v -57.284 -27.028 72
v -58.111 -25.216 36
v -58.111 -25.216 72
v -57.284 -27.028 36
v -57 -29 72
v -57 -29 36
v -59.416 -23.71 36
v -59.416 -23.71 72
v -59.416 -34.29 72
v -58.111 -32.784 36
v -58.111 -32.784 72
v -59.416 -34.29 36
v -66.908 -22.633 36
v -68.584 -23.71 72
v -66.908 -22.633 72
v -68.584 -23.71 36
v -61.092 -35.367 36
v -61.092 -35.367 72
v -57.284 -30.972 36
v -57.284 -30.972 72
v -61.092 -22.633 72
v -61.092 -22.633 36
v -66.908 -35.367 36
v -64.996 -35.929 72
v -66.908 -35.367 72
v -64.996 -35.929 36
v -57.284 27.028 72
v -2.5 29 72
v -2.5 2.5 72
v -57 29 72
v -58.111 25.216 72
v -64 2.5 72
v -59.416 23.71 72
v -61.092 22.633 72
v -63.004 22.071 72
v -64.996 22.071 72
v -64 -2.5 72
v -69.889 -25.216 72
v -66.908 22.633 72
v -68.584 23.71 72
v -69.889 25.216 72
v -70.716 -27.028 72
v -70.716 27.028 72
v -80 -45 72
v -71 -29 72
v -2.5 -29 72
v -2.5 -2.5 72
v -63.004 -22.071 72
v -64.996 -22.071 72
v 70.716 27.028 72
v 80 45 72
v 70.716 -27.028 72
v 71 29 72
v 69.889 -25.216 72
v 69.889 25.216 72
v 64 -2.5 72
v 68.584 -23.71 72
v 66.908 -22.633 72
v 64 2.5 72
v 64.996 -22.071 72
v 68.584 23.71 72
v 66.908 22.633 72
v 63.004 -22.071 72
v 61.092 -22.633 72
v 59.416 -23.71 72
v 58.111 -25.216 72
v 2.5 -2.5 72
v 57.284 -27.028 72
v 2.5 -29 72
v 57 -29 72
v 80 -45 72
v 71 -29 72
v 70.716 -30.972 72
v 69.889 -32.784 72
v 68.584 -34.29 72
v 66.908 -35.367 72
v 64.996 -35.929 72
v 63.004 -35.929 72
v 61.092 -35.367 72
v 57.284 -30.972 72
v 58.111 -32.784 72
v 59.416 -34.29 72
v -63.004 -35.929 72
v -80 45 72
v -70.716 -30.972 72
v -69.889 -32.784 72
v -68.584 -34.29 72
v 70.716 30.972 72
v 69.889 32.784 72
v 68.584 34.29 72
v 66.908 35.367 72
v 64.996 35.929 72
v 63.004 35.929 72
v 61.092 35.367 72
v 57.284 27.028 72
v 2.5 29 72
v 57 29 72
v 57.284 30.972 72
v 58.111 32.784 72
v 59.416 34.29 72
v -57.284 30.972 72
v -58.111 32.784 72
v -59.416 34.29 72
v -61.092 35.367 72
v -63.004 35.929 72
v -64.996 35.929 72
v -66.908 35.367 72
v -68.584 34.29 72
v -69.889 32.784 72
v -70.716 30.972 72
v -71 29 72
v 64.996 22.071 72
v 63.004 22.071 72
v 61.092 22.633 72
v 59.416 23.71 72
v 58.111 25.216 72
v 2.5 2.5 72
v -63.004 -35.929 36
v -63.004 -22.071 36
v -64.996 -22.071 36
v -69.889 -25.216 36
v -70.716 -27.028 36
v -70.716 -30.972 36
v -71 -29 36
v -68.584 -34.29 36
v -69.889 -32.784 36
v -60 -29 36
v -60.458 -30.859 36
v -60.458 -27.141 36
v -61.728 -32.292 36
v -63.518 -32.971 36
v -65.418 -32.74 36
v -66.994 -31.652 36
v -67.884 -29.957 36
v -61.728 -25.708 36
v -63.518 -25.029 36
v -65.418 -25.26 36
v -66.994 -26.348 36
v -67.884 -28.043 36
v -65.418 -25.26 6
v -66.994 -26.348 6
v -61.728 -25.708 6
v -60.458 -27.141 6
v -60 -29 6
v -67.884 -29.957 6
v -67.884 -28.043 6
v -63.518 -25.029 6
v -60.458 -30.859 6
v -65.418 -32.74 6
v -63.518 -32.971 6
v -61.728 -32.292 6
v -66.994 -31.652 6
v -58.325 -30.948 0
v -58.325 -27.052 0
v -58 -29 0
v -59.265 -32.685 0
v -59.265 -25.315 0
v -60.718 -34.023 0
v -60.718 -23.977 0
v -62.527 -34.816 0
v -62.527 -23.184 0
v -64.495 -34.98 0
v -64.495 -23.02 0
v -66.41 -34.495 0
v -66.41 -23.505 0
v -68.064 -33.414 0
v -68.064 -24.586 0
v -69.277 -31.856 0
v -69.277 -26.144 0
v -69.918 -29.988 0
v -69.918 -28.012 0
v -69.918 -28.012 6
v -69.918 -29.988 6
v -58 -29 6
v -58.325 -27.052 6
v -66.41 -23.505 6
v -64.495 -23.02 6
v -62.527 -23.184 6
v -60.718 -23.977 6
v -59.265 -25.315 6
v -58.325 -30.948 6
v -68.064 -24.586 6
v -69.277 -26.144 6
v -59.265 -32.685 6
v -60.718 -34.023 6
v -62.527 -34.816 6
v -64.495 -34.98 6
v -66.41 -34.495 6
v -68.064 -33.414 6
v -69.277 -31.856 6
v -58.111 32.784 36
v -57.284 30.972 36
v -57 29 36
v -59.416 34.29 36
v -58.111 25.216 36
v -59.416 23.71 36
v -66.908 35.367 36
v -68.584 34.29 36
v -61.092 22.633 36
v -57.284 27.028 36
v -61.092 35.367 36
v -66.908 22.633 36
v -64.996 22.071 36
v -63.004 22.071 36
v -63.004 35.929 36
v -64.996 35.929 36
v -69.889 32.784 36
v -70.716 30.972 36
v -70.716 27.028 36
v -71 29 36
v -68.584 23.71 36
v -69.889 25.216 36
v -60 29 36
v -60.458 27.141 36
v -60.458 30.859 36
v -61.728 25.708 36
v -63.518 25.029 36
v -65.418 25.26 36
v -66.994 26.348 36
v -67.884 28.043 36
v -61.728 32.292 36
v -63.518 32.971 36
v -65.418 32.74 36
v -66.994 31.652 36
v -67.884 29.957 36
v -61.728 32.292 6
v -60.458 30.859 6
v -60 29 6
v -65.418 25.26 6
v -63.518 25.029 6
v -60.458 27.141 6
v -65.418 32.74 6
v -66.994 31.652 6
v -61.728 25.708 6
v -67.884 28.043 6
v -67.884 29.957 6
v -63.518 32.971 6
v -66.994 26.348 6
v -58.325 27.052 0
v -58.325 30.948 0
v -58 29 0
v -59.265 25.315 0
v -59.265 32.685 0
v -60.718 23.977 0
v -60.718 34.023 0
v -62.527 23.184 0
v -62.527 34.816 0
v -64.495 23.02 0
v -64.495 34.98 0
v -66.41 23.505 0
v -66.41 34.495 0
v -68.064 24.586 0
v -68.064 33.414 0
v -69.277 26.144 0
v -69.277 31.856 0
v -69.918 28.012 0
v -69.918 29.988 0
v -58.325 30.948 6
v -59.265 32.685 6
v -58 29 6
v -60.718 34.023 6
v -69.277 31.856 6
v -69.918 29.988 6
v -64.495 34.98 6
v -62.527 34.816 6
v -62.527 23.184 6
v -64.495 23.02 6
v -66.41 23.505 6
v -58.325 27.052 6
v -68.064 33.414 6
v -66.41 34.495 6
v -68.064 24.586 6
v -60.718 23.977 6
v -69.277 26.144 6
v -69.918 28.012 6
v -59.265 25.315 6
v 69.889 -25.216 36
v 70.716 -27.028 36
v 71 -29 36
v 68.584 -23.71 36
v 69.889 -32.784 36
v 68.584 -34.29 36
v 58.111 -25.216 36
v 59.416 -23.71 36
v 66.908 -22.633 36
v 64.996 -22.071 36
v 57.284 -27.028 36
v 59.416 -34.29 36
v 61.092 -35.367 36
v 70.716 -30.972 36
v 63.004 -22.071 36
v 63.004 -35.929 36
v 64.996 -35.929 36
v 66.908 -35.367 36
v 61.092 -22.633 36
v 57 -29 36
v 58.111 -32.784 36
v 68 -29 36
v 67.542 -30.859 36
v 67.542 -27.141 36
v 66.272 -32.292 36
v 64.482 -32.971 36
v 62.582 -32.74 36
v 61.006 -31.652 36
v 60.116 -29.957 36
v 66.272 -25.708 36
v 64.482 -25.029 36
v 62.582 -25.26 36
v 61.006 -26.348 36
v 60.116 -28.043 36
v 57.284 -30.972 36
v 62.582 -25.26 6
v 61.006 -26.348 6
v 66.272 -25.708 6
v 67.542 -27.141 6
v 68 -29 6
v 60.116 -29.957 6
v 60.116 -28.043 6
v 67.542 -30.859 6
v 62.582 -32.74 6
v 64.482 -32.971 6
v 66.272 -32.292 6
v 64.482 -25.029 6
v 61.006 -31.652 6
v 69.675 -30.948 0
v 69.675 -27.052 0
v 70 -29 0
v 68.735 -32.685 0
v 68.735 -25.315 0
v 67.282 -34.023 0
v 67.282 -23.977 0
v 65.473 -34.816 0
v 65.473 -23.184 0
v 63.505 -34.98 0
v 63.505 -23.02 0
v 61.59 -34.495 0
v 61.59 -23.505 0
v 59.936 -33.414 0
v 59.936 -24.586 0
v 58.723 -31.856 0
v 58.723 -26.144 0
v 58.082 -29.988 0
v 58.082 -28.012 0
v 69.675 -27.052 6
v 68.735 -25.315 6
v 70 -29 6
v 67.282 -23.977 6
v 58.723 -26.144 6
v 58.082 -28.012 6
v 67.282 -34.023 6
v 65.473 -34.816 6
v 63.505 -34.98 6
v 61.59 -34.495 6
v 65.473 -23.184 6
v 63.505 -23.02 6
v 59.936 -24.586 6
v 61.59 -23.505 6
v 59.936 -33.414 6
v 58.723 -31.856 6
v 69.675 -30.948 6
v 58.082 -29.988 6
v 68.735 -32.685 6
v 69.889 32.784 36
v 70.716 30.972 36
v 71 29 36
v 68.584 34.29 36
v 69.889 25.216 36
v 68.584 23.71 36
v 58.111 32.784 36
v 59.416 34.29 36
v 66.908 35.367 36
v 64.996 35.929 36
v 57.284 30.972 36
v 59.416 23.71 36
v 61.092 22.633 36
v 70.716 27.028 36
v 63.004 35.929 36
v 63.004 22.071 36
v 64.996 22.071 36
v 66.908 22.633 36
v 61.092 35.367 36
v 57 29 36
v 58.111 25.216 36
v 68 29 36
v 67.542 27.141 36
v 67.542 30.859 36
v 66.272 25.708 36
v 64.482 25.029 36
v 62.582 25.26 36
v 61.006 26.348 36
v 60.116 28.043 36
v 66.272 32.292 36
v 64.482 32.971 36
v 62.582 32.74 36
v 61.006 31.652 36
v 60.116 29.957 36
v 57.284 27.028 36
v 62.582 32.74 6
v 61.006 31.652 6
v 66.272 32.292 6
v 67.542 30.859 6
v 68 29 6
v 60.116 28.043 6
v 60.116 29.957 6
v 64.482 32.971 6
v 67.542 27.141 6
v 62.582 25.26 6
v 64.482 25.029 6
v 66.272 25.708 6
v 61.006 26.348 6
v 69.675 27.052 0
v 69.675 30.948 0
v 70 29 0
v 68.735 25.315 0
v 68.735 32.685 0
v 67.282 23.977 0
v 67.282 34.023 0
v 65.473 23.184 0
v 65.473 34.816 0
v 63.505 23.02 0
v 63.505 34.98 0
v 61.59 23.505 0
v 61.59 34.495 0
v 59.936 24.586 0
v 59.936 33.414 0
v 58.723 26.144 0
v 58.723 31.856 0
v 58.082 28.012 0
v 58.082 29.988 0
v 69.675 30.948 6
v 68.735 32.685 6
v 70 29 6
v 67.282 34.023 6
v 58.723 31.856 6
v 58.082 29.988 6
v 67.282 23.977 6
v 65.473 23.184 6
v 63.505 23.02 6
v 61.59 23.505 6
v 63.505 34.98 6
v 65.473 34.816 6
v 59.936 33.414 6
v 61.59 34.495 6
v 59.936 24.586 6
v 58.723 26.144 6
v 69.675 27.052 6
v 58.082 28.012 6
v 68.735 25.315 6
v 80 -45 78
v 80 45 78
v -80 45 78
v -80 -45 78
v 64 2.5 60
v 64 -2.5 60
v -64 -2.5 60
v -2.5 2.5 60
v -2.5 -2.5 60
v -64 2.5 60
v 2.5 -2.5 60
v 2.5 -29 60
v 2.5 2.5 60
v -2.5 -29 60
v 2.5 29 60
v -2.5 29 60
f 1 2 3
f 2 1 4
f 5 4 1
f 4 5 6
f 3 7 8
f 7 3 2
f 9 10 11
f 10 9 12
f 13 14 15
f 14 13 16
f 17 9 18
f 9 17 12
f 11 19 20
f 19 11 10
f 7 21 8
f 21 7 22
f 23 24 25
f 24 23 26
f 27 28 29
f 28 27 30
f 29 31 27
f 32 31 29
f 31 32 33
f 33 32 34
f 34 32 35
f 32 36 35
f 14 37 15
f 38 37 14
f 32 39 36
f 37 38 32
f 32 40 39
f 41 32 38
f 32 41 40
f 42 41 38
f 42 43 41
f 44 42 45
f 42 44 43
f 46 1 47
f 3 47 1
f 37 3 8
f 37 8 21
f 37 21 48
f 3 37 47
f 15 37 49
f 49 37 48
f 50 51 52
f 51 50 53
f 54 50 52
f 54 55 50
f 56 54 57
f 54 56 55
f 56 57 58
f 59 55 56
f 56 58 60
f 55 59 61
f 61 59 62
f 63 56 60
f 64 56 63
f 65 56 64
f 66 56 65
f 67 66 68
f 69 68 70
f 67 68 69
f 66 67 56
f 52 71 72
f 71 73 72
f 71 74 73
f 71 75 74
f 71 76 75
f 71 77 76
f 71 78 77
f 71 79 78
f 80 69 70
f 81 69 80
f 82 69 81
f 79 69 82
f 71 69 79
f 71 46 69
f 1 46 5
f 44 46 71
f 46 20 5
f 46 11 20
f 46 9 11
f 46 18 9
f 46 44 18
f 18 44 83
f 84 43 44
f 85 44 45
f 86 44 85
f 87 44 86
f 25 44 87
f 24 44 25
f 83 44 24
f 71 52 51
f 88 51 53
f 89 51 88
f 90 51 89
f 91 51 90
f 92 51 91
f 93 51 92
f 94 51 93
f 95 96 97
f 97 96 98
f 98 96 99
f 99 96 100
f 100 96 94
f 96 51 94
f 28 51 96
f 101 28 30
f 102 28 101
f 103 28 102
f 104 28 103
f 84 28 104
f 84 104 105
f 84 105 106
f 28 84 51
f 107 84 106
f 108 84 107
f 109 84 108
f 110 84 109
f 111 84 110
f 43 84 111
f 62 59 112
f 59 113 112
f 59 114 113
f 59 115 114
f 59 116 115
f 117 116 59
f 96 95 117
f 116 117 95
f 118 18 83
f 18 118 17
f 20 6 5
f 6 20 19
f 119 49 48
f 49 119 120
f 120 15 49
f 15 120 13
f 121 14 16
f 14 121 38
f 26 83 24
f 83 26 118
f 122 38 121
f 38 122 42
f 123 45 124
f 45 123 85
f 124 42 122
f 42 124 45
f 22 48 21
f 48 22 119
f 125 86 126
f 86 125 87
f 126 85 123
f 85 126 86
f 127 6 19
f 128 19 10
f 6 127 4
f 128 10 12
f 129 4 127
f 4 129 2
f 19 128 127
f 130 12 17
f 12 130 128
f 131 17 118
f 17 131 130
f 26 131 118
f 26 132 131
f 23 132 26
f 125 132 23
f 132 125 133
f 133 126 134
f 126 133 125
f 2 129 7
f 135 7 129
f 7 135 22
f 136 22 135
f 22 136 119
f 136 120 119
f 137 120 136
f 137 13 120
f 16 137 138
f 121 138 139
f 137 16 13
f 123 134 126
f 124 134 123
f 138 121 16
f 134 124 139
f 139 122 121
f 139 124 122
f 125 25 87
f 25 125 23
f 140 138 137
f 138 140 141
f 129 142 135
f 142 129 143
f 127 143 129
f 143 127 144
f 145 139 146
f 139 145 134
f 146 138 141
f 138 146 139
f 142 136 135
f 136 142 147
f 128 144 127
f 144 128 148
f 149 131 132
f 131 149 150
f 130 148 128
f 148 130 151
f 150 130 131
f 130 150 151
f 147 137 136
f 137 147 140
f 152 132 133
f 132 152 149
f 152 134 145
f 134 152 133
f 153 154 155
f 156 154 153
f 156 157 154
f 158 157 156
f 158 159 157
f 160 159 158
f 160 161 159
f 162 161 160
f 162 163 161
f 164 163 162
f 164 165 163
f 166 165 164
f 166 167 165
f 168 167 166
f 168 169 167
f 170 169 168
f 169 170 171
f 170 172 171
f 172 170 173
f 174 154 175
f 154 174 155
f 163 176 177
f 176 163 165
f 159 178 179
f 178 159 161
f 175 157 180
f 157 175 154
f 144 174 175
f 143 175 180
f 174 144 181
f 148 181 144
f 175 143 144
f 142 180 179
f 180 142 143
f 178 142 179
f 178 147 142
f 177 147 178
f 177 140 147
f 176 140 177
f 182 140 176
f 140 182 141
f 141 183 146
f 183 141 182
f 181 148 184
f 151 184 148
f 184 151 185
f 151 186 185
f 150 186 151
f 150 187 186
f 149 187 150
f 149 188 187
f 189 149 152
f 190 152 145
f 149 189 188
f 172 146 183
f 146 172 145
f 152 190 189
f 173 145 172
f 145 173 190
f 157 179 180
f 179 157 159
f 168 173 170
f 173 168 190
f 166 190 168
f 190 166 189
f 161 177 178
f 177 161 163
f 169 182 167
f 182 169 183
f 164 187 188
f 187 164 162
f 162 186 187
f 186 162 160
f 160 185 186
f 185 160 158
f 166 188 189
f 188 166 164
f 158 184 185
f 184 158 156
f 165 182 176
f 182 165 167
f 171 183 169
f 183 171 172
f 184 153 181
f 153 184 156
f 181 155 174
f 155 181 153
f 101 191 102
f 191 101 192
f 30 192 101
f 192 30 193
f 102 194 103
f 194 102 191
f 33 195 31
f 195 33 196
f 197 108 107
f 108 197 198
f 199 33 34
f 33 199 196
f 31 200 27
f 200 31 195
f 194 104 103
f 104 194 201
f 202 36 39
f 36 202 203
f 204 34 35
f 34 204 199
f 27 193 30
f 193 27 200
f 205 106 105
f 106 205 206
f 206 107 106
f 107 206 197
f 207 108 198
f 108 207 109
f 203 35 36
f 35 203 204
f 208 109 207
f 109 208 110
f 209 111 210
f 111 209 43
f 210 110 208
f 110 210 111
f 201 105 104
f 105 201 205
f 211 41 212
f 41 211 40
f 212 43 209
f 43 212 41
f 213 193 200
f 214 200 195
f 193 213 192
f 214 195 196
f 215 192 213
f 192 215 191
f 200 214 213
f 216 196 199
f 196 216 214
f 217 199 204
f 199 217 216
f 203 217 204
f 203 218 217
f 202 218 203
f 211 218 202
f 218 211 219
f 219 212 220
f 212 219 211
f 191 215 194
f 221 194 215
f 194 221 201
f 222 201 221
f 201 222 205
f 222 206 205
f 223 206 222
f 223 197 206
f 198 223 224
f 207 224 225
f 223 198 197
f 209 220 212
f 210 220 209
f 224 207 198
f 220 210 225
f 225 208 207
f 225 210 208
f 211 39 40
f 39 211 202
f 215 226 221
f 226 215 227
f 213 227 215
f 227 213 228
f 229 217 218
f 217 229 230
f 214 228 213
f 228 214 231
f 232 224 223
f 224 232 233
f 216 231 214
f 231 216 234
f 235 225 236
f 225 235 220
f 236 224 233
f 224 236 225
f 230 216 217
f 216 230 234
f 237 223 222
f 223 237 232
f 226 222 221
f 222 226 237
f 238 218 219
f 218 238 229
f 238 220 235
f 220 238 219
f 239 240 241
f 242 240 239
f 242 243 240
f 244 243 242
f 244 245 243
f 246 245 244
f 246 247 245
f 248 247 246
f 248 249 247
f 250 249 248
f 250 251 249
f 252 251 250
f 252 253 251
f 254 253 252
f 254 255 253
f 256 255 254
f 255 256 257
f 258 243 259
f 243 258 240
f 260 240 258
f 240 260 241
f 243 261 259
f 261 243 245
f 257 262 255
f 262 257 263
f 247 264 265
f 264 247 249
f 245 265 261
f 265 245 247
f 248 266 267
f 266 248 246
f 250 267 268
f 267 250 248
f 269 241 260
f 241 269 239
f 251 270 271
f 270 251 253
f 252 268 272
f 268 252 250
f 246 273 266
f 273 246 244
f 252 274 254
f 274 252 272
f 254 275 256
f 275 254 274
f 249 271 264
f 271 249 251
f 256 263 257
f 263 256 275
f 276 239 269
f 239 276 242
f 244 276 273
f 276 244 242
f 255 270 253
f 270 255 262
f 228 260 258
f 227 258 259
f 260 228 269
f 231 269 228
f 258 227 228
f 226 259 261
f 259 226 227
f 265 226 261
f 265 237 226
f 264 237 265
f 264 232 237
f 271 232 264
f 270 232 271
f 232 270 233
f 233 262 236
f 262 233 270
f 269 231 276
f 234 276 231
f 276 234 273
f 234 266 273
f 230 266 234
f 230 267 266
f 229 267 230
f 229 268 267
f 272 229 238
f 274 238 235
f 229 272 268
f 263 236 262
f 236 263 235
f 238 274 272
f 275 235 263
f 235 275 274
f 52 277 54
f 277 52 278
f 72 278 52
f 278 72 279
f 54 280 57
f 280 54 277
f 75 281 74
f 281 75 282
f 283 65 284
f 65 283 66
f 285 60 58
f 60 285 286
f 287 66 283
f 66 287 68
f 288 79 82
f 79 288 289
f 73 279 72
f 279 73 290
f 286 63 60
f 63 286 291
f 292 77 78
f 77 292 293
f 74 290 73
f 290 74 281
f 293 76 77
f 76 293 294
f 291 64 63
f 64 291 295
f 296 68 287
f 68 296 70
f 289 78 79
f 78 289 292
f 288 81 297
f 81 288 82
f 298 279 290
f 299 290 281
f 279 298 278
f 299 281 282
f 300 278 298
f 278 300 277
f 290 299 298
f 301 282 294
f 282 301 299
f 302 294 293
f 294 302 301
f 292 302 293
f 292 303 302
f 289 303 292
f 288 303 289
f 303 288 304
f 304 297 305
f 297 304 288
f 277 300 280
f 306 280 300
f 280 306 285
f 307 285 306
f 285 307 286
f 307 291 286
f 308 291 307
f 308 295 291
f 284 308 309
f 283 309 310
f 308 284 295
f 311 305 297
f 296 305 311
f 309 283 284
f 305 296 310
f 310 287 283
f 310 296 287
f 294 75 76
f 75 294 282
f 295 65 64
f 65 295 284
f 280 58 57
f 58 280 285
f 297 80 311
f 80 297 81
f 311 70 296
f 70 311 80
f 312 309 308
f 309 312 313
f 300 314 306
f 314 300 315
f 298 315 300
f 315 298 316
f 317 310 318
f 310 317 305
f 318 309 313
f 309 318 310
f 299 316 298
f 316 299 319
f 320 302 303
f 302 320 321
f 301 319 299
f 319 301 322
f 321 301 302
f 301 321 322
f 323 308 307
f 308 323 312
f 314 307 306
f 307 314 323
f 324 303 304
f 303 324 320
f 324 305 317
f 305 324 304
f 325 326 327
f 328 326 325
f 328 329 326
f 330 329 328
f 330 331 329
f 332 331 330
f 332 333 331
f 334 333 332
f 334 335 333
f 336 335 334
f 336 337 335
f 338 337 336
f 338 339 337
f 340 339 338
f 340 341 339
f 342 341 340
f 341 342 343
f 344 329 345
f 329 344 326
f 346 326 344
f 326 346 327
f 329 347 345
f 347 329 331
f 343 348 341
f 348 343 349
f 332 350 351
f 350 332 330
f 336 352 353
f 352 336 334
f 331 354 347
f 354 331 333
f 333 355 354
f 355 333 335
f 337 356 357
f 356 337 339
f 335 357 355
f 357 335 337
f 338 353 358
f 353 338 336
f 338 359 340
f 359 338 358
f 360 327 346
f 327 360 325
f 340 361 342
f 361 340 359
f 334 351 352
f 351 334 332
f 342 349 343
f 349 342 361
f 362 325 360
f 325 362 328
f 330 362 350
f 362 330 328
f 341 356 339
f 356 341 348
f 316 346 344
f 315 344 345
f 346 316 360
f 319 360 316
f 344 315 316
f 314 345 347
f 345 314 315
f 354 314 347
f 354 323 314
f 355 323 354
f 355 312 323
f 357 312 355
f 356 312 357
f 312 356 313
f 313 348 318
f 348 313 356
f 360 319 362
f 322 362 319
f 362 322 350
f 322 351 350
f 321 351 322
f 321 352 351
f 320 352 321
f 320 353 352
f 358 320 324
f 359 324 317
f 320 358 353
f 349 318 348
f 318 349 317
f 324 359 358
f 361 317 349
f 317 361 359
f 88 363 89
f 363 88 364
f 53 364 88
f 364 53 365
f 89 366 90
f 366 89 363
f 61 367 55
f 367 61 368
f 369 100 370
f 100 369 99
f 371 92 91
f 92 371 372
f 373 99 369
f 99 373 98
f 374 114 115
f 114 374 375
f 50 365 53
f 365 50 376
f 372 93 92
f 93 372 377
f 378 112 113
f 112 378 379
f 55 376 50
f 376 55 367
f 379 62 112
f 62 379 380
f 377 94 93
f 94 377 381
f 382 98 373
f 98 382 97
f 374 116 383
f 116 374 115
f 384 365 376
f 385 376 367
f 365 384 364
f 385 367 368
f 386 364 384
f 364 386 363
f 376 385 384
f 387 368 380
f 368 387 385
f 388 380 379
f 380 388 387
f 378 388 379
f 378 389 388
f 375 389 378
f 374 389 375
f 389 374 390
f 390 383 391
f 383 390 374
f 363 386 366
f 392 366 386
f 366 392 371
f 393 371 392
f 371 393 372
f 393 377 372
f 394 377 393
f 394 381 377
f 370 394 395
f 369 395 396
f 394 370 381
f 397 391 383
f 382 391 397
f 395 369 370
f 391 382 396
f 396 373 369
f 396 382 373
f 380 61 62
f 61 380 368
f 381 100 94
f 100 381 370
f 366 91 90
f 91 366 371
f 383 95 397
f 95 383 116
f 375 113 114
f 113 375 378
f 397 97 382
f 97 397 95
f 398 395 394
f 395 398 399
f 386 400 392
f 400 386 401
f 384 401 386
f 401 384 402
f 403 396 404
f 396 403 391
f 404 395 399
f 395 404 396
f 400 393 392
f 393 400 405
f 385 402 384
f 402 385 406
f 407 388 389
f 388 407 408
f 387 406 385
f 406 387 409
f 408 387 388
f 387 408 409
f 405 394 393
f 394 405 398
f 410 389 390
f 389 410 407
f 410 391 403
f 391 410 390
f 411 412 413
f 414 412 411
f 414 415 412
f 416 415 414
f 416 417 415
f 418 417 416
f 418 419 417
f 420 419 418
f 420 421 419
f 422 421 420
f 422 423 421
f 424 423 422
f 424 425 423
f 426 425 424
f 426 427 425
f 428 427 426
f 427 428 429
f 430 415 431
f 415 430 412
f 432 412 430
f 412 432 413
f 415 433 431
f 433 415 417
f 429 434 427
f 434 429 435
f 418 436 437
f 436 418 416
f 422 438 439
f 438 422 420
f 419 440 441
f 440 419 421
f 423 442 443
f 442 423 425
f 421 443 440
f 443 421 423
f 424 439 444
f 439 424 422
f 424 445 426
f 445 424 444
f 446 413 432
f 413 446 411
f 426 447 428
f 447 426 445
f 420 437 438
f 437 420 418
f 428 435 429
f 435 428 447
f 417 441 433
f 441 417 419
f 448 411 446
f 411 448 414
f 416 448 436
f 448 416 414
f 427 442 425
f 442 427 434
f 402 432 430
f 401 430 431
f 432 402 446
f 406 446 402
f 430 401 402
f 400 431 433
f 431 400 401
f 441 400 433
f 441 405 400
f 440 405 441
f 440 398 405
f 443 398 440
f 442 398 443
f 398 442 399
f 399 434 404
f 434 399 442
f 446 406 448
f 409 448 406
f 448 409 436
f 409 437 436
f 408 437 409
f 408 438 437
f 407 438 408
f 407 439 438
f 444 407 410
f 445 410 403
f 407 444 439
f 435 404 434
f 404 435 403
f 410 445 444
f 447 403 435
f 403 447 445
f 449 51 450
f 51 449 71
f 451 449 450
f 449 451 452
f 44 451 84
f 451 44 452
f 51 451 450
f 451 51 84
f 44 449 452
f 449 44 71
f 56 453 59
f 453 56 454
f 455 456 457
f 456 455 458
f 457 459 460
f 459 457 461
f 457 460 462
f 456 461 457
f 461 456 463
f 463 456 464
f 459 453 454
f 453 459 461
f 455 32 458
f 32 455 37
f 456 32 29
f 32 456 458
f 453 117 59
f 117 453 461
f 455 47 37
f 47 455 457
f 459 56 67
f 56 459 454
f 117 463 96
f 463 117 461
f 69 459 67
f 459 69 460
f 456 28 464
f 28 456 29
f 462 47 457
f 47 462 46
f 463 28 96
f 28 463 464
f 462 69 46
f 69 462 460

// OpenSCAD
// 3DScad sample: dining table with turned legs
// Uses only the currently round-trippable subset.

module scene_model() {
    top_w = 160;
    top_d = 90;
    top_h = 6;
    leg_h = 72;
    leg_r_top = 7;
    leg_r_mid = 4;
    leg_r_bot = 6;
    inset = 16;
    apron_h = 12;
    apron_t = 5;

    union() {
        translate([0, 0, leg_h + top_h / 2]) {
            cube([top_w, top_d, top_h], center=true);
        }
        translate([0, 0, leg_h - apron_h / 2]) {
            cube([top_w - inset * 2, apron_t, apron_h], center=true);
        }
        translate([0, 0, leg_h - apron_h / 2]) {
            cube([apron_t, top_d - inset * 2, apron_h], center=true);
        }
        for (sx = [-1 : 2 : 1]) {
            for (sy = [-1 : 2 : 1]) {
                translate([sx * (top_w / 2 - inset), sy * (top_d / 2 - inset), leg_h * 3 / 4]) {
                    cylinder(h=leg_h / 2, r=leg_r_top, center=true);
                }
                translate([sx * (top_w / 2 - inset), sy * (top_d / 2 - inset), leg_h / 4]) {
                    cylinder(h=leg_h / 2, r=leg_r_mid, center=true);
                }
                translate([sx * (top_w / 2 - inset), sy * (top_d / 2 - inset), leg_r_bot / 2]) {
                    cylinder(h=leg_r_bot, r=leg_r_bot, center=true);
                }
            }
        }
    }
}

scene_model();
